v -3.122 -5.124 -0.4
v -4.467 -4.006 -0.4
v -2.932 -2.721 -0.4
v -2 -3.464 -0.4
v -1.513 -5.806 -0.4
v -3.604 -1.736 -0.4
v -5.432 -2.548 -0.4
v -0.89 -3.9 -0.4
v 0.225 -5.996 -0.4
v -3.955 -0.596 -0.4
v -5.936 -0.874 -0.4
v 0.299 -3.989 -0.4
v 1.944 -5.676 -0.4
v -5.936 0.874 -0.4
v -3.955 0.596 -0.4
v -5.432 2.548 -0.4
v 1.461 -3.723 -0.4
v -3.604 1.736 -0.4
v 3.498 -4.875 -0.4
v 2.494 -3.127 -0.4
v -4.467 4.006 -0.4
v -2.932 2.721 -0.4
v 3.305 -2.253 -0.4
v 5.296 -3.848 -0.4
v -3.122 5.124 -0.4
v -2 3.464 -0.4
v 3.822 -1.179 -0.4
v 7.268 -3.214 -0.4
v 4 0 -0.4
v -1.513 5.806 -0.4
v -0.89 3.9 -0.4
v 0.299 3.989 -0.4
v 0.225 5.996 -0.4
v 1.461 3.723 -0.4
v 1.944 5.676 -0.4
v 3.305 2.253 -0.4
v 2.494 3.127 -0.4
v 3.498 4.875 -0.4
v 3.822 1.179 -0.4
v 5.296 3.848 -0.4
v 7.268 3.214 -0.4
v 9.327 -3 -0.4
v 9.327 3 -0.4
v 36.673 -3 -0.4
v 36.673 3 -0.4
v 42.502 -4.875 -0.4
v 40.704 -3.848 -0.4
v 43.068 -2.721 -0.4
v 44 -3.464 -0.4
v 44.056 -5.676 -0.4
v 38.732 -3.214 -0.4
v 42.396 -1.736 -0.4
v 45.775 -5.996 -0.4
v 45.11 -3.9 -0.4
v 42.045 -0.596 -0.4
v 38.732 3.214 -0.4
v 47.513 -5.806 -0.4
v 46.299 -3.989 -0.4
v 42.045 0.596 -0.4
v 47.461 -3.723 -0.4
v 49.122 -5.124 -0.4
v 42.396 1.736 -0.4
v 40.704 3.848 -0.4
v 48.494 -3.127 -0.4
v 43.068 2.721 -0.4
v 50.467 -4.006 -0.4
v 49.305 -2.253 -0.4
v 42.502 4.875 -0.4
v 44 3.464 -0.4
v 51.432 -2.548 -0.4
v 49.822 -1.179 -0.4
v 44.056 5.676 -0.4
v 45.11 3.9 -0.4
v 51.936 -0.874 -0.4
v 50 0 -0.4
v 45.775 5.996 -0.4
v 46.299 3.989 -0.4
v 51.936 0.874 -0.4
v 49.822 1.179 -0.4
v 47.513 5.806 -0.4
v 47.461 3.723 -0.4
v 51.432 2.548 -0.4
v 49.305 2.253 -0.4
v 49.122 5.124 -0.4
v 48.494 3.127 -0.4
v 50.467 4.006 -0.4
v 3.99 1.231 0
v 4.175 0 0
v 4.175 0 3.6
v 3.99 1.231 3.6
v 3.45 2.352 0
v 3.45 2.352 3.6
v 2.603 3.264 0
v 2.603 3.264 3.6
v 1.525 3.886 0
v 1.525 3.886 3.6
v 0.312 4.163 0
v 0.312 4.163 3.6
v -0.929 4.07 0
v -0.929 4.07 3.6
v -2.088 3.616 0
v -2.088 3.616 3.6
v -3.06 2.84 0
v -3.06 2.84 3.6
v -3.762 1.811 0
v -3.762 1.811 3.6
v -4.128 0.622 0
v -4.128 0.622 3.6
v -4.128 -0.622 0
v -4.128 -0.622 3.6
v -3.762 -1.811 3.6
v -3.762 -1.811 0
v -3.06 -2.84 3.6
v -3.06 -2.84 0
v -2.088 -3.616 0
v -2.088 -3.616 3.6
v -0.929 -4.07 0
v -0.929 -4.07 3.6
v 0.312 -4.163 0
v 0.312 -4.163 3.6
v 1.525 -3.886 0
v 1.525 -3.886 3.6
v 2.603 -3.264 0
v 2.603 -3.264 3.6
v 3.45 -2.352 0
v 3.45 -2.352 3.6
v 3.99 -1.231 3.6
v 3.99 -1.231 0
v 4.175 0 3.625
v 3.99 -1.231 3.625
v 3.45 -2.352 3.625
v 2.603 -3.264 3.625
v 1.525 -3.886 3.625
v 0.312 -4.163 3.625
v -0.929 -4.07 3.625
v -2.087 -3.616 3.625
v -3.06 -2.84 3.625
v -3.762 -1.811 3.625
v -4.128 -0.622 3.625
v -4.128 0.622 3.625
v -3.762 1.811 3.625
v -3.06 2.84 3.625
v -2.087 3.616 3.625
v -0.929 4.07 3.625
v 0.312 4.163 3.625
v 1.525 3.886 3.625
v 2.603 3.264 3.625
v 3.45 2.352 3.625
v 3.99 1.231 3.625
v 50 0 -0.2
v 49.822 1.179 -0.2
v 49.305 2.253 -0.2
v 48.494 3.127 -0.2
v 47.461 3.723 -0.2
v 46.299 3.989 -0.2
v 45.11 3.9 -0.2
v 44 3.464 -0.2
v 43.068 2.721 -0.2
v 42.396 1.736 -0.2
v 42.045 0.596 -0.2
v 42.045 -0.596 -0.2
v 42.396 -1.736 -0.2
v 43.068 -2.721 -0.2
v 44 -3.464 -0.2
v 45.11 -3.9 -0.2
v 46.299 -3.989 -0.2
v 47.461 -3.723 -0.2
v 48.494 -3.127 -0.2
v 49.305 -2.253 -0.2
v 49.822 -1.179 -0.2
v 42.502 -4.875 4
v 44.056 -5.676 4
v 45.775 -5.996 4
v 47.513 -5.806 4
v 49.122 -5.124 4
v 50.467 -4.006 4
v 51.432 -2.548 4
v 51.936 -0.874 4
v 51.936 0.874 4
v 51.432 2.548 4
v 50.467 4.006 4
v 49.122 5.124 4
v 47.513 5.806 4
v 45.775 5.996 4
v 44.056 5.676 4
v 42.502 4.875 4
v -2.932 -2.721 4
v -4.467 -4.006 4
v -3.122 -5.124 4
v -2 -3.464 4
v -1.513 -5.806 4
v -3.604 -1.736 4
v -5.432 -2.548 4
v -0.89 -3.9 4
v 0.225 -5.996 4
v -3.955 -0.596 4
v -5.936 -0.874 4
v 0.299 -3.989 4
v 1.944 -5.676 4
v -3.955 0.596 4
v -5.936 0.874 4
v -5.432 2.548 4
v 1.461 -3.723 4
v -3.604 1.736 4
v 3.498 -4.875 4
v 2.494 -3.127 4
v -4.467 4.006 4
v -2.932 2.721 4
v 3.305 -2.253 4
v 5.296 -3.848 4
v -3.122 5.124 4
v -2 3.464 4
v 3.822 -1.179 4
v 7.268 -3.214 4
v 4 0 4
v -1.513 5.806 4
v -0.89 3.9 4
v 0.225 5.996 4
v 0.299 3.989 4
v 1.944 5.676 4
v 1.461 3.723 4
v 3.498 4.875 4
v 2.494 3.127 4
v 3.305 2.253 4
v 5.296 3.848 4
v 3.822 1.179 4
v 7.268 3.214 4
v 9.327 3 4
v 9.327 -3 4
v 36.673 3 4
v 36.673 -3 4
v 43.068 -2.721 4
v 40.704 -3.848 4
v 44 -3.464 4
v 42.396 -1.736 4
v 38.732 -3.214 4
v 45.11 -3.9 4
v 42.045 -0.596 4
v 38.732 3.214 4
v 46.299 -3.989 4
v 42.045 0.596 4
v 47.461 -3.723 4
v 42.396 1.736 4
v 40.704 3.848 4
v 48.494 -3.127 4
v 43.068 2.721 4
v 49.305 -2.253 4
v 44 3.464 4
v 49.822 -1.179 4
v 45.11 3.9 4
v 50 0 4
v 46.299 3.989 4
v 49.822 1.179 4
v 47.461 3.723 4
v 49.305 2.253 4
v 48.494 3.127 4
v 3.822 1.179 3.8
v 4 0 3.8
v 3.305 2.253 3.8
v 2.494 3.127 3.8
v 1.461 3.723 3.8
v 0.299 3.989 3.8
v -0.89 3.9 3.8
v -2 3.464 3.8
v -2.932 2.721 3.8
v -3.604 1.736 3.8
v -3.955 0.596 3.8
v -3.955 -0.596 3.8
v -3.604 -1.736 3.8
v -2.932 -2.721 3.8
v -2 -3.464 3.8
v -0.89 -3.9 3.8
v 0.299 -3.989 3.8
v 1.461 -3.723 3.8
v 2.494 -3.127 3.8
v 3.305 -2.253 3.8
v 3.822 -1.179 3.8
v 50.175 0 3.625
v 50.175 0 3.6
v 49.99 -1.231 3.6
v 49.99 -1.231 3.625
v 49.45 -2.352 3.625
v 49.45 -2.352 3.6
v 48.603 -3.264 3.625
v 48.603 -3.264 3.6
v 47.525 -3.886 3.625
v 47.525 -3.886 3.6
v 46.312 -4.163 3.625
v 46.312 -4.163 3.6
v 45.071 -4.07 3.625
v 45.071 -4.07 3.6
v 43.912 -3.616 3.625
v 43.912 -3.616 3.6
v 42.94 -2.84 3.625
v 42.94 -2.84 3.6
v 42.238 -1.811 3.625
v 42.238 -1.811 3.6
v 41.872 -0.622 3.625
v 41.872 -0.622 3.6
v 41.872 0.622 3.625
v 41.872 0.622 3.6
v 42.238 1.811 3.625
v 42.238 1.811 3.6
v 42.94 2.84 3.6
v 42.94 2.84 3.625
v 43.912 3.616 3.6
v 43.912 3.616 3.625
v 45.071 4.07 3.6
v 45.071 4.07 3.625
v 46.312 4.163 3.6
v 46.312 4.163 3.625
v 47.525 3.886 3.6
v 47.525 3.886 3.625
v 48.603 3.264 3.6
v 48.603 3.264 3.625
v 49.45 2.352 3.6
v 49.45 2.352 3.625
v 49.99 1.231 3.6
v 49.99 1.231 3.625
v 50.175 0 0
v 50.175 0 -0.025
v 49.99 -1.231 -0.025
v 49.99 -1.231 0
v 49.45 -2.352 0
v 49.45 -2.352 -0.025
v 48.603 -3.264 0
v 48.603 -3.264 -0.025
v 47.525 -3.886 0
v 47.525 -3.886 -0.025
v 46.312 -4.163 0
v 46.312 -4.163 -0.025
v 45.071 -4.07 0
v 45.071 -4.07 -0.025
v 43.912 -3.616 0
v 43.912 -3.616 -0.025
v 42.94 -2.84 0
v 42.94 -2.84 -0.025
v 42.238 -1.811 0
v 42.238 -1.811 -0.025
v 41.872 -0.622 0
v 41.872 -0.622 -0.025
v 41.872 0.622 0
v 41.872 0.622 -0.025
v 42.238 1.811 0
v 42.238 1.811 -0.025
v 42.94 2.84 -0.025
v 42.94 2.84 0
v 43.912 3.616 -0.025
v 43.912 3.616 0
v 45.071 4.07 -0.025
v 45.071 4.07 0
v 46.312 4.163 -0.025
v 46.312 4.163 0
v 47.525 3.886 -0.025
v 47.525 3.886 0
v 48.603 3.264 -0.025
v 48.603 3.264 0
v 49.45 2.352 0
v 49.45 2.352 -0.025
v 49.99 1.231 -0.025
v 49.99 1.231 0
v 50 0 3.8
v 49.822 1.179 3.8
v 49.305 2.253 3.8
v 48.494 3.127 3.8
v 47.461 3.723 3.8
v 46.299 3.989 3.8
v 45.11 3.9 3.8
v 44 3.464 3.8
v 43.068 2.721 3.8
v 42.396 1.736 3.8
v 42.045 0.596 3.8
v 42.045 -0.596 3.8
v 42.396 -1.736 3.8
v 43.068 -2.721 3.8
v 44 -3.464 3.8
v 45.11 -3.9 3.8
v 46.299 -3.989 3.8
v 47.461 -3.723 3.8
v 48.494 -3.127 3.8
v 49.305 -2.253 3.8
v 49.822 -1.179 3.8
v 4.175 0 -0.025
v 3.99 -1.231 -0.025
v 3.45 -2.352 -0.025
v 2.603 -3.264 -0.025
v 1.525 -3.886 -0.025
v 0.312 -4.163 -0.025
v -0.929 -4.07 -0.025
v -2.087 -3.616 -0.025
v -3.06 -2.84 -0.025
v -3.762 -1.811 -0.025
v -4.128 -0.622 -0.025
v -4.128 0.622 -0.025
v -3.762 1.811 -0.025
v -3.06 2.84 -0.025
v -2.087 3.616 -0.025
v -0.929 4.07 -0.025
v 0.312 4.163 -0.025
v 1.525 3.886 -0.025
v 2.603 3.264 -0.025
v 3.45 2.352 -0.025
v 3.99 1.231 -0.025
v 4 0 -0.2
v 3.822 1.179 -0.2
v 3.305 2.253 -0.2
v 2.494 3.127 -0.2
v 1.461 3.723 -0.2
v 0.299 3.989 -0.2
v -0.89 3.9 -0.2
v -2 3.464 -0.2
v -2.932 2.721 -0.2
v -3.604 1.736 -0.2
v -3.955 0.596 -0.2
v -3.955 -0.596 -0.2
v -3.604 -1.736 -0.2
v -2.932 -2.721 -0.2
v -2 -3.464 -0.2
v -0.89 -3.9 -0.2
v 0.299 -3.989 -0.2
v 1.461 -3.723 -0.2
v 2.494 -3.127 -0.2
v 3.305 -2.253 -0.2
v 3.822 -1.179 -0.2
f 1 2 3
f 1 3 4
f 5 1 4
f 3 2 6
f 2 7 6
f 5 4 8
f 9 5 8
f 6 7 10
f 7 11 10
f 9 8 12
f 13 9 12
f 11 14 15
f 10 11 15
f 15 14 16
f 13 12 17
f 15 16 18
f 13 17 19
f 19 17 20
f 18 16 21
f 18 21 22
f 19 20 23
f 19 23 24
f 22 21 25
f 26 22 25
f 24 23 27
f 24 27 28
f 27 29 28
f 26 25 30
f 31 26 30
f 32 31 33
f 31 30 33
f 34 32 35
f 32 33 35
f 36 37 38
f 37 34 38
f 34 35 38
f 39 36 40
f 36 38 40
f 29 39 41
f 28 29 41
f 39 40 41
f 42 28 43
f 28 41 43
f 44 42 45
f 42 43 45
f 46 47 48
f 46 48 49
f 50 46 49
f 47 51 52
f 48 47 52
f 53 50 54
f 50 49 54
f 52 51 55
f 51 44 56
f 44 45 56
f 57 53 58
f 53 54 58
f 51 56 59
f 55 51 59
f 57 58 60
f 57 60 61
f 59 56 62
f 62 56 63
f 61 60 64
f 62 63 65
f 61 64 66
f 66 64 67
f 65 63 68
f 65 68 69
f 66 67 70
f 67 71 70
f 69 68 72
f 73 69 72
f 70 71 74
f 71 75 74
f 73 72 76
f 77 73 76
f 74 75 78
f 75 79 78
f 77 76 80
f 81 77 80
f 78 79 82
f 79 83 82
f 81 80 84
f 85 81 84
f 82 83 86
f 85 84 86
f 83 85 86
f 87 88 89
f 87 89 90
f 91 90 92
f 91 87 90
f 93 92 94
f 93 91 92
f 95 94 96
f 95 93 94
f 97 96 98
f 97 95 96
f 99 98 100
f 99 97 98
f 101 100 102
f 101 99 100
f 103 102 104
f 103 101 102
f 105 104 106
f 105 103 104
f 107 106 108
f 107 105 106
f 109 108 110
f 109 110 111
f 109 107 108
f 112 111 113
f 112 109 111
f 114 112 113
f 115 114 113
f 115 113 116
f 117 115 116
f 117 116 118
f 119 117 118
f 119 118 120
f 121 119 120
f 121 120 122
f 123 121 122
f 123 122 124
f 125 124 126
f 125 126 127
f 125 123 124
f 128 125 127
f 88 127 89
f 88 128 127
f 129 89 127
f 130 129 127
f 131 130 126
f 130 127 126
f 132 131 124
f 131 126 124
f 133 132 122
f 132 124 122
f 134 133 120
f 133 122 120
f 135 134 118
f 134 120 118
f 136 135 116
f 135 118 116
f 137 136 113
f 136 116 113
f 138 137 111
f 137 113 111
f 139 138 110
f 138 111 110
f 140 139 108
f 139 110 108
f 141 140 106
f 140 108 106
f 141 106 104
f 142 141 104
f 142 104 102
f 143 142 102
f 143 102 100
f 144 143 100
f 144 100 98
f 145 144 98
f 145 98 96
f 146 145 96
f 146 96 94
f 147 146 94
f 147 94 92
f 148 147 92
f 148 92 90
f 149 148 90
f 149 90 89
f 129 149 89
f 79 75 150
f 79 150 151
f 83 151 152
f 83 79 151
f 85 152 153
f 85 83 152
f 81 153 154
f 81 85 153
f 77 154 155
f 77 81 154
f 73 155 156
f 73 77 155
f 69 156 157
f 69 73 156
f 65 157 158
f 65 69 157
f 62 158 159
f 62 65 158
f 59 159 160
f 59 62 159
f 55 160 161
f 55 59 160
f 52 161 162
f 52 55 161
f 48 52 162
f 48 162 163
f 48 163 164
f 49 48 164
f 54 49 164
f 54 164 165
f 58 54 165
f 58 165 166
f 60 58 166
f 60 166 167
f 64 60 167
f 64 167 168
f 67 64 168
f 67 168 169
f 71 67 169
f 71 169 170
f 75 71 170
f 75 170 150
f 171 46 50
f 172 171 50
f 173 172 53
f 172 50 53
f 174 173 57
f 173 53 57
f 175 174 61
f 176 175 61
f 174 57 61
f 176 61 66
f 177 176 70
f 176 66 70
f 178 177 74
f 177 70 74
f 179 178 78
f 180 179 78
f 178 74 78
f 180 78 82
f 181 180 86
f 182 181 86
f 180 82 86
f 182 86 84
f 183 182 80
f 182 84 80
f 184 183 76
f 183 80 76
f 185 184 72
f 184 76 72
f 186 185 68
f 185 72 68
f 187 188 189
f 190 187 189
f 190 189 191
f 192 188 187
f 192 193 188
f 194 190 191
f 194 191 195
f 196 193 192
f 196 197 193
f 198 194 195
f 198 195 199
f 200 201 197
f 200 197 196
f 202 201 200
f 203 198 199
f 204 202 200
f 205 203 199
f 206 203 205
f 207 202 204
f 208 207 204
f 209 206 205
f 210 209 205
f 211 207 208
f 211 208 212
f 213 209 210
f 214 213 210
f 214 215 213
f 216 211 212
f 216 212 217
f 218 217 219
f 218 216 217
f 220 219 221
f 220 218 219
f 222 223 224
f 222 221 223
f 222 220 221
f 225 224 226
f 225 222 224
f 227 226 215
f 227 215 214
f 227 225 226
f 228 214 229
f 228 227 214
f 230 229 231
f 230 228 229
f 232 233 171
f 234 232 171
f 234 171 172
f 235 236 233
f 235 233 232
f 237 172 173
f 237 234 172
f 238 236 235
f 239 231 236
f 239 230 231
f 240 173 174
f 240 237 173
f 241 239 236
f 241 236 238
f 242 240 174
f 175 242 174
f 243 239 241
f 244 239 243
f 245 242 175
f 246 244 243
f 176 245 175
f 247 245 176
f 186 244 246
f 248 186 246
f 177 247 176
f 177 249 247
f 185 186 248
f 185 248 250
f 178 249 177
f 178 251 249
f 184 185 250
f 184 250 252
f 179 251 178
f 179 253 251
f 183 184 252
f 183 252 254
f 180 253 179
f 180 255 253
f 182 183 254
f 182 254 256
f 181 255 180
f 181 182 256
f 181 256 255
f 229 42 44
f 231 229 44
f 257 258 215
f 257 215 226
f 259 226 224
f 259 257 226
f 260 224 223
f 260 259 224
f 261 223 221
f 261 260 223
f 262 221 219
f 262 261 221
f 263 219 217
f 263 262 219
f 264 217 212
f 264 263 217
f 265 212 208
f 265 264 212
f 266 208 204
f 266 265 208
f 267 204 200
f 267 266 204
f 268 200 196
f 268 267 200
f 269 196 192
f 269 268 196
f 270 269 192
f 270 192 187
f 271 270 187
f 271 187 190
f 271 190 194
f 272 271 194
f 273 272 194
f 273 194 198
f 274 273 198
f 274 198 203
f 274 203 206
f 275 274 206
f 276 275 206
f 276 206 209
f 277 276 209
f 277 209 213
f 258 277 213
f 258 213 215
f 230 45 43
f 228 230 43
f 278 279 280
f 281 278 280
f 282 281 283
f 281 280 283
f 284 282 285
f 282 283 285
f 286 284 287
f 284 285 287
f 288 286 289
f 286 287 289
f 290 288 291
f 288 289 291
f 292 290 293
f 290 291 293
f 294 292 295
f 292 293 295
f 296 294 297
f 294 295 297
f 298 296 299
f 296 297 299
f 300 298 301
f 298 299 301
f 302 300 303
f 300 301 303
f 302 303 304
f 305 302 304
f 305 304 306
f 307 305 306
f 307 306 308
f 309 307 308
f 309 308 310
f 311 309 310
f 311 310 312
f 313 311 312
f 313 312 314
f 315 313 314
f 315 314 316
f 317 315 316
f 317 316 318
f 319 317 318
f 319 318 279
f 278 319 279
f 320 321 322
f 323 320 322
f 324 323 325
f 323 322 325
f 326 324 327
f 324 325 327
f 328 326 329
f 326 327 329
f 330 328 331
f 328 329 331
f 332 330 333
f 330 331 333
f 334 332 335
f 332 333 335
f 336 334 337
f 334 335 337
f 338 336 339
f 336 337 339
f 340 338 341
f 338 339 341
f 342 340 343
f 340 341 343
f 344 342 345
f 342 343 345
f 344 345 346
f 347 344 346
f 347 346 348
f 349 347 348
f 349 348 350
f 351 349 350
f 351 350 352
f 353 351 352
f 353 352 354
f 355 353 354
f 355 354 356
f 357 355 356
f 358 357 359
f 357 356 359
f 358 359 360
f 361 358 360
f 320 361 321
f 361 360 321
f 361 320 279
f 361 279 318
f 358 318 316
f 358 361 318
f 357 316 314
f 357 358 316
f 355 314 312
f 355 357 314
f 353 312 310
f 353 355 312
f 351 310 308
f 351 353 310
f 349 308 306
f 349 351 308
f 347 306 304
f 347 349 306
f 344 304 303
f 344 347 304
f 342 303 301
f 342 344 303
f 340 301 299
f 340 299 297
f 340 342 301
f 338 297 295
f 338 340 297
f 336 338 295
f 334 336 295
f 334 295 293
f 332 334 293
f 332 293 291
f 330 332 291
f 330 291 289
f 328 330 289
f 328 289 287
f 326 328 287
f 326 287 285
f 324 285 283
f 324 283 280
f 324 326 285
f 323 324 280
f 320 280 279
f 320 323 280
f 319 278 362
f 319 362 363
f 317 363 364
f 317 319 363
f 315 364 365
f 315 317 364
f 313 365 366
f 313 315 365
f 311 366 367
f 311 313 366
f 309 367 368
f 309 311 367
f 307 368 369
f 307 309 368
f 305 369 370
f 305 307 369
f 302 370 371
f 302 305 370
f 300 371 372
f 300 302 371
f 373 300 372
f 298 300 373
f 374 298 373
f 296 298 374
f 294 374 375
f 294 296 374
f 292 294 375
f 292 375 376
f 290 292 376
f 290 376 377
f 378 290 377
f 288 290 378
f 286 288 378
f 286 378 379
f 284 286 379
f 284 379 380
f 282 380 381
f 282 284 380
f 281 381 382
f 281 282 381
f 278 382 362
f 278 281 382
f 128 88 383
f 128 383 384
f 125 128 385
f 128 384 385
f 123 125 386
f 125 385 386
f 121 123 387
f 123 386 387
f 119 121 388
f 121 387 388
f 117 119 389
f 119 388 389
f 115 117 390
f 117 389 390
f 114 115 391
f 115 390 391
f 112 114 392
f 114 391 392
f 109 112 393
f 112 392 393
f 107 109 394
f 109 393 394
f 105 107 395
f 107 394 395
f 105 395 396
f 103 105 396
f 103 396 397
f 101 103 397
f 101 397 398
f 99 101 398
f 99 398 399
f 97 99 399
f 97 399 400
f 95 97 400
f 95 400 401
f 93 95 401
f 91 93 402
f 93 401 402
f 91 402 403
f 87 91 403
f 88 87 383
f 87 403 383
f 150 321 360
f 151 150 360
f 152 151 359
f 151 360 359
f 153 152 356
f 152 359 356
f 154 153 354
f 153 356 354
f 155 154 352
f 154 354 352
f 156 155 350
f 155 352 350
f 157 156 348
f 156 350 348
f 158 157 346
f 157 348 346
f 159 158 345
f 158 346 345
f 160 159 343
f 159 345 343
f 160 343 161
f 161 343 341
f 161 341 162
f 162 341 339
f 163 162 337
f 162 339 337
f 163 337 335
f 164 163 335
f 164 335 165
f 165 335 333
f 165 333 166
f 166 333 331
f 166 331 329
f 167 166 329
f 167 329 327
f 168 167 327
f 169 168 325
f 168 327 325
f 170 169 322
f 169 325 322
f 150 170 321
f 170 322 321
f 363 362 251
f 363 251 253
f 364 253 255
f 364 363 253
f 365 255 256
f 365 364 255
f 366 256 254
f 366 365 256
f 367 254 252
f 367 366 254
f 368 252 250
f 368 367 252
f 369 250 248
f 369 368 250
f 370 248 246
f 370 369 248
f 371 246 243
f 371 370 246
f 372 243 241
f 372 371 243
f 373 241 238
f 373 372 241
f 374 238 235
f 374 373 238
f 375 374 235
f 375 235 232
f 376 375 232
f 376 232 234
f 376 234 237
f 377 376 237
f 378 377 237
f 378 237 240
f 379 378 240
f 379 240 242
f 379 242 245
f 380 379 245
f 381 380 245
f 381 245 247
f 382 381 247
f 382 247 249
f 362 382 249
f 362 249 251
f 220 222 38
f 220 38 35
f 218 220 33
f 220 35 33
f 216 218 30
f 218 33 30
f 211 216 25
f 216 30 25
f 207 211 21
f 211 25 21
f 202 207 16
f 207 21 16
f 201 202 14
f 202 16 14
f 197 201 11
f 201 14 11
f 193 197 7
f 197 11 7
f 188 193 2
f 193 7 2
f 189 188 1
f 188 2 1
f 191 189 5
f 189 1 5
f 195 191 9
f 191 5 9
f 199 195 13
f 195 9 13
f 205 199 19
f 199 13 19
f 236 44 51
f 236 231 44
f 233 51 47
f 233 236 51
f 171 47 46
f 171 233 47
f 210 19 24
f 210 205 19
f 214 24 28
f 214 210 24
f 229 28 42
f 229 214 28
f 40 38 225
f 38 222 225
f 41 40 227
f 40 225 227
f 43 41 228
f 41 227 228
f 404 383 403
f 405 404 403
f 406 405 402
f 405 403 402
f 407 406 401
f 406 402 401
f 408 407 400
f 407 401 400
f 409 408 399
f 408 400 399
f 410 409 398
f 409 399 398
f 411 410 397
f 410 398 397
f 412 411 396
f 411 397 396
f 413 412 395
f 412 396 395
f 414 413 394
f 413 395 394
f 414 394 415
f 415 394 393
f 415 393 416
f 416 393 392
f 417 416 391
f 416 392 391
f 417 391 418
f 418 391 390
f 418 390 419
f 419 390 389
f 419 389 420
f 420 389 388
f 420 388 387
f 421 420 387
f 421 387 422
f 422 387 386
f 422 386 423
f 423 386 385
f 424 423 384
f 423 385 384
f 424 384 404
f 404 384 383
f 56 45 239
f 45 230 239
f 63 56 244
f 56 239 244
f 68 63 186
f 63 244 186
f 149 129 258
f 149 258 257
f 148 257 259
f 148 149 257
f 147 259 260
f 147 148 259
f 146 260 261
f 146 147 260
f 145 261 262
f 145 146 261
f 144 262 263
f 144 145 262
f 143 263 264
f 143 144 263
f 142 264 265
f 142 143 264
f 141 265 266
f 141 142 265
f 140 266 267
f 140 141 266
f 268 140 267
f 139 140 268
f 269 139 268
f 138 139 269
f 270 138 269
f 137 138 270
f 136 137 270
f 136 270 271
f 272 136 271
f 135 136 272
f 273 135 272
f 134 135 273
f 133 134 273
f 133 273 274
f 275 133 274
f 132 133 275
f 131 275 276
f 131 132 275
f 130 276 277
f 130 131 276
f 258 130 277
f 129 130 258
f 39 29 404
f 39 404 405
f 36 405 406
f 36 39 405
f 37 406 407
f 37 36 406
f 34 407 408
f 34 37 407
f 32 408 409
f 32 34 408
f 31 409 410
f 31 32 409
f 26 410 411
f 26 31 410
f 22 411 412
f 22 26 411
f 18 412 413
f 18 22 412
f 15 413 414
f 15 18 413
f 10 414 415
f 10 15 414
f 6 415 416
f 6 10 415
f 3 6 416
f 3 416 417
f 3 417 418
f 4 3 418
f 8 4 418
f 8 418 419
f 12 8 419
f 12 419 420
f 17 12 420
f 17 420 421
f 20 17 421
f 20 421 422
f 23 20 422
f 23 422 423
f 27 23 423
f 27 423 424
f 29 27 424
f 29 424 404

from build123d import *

# Parameters (mm, degrees)
EXTRUDE_1_DEPTH      = 4
EXTRUDE_1_DEPTH_BACK = 0.4
SKETCH_1_R           = 4
SKETCH_1_3_R         = 4.175
SKETCH_1_3_R_2       = 4
CUT_EXTRUDE_1_DEPTH  = 3.6
CHAMFER_1_SIZE       = 0.2
FILLET_1_R           = 10


with BuildPart() as part:
    # 草图1 → 凸台-拉伸1 (new, two sides: drawn at the far end of the back side and taken through both)
    with BuildSketch(Plane.XY.offset(-EXTRUDE_1_DEPTH_BACK)):
        with BuildLine():
            ThreePointArc((5.196152423, 3), (-6, 0), (5.196152423, -3))
            Line((5.196152423, -3), (40.803847577, -3))
            ThreePointArc((40.803847577, -3), (52, 0), (40.803847577, 3))
            Line((40.803847577, 3), (5.196152423, 3))
        make_face()
        Circle(SKETCH_1_R, mode=Mode.SUBTRACT)
        with Locations((46, 0)):
            Circle(SKETCH_1_R, mode=Mode.SUBTRACT)
    extrude(amount=EXTRUDE_1_DEPTH + EXTRUDE_1_DEPTH_BACK)

    # 草图1<3> → 切除-拉伸1 (cut)
    # profile 1 of 2: a face of its own
    with BuildSketch(Plane.XY):
        Circle(SKETCH_1_3_R)
        Circle(SKETCH_1_3_R_2, mode=Mode.SUBTRACT)
    # profile 2 of 2: a face of its own
    with BuildSketch(Plane.XY):
        with Locations((46, 0)):
            Circle(SKETCH_1_3_R)
        with Locations((46, 0)):
            Circle(SKETCH_1_3_R_2, mode=Mode.SUBTRACT)
    extrude(amount=CUT_EXTRUDE_1_DEPTH, mode=Mode.SUBTRACT)

    # 倒角1
    # the kernel refuses this chamfer: 0.2 mm, written as the material it takes off along each edge
    with BuildSketch(Plane(origin=(0, 0, 3.6), x_dir=(1, 0, 0), z_dir=(0, -1, 0))) as chamfer_1_piece_1_section:
        Polygon((4, CHAMFER_1_SIZE), (4 + CHAMFER_1_SIZE, 0), (4, 0), align=None)
    chamfer_1_piece_1 = revolve(axis=Axis((0, 0, 3.6), (0, 0, 1)), mode=Mode.PRIVATE)
    chamfer_1_piece_1 = chamfer_1_piece_1 & Plane(origin=(0, 0, 3.709543273), x_dir=(1, 0, 0), z_dir=(0, 0, -1)) * Cylinder(4.175, 17, mode=Mode.PRIVATE)
    add(chamfer_1_piece_1, mode=Mode.SUBTRACT)
    with BuildSketch(Plane(origin=(46, 0, 3.6), x_dir=(1, 0, 0), z_dir=(0, -1, 0))) as chamfer_1_piece_2_section:
        Polygon((4, CHAMFER_1_SIZE), (4 + CHAMFER_1_SIZE, 0), (4, 0), align=None)
    chamfer_1_piece_2 = revolve(axis=Axis((46, 0, 3.6), (0, 0, 1)), mode=Mode.PRIVATE)
    chamfer_1_piece_2 = chamfer_1_piece_2 & Plane(origin=(46, 0, 3.709543273), x_dir=(1, 0, 0), z_dir=(0, 0, -1)) * Cylinder(4.175, 17, mode=Mode.PRIVATE)
    add(chamfer_1_piece_2, mode=Mode.SUBTRACT)
    with BuildSketch(Plane(origin=(46, 0, 0), x_dir=(1, 0, 0), z_dir=(0, -1, 0))) as chamfer_1_piece_3_section:
        Polygon((4, -CHAMFER_1_SIZE), (4 + CHAMFER_1_SIZE, 0), (4, 0), align=None)
    chamfer_1_piece_3 = revolve(axis=Axis((46, 0, 0), (0, 0, 1)), mode=Mode.PRIVATE)
    chamfer_1_piece_3 = chamfer_1_piece_3 & Plane(origin=(46, 0, -0.109543273), x_dir=(1, 0, 0), z_dir=(0, 0, -1)) * Cylinder(4.175, 17, mode=Mode.PRIVATE)
    add(chamfer_1_piece_3, mode=Mode.SUBTRACT)
    with BuildSketch(Plane(origin=(0, 0, 0), x_dir=(1, 0, 0), z_dir=(0, -1, 0))) as chamfer_1_piece_4_section:
        Polygon((4, -CHAMFER_1_SIZE), (4 + CHAMFER_1_SIZE, 0), (4, 0), align=None)
    chamfer_1_piece_4 = revolve(axis=Axis((0, 0, 0), (0, 0, 1)), mode=Mode.PRIVATE)
    chamfer_1_piece_4 = chamfer_1_piece_4 & Plane(origin=(0, 0, -0.109543273), x_dir=(1, 0, 0), z_dir=(0, 0, -1)) * Cylinder(4.175, 17, mode=Mode.PRIVATE)
    add(chamfer_1_piece_4, mode=Mode.SUBTRACT)

    # 圆角1
    fillet_1_edges = [part.edges().sort_by_distance(p)[0] for p in [
        (5.196152423, -3, 1.8),
        (5.196152423, 3, 1.8),
        (40.803847577, 3, 1.8),
        (40.803847577, -3, 1.8),
    ]]
    fillet(fillet_1_edges, radius=FILLET_1_R)


solid = part.part
